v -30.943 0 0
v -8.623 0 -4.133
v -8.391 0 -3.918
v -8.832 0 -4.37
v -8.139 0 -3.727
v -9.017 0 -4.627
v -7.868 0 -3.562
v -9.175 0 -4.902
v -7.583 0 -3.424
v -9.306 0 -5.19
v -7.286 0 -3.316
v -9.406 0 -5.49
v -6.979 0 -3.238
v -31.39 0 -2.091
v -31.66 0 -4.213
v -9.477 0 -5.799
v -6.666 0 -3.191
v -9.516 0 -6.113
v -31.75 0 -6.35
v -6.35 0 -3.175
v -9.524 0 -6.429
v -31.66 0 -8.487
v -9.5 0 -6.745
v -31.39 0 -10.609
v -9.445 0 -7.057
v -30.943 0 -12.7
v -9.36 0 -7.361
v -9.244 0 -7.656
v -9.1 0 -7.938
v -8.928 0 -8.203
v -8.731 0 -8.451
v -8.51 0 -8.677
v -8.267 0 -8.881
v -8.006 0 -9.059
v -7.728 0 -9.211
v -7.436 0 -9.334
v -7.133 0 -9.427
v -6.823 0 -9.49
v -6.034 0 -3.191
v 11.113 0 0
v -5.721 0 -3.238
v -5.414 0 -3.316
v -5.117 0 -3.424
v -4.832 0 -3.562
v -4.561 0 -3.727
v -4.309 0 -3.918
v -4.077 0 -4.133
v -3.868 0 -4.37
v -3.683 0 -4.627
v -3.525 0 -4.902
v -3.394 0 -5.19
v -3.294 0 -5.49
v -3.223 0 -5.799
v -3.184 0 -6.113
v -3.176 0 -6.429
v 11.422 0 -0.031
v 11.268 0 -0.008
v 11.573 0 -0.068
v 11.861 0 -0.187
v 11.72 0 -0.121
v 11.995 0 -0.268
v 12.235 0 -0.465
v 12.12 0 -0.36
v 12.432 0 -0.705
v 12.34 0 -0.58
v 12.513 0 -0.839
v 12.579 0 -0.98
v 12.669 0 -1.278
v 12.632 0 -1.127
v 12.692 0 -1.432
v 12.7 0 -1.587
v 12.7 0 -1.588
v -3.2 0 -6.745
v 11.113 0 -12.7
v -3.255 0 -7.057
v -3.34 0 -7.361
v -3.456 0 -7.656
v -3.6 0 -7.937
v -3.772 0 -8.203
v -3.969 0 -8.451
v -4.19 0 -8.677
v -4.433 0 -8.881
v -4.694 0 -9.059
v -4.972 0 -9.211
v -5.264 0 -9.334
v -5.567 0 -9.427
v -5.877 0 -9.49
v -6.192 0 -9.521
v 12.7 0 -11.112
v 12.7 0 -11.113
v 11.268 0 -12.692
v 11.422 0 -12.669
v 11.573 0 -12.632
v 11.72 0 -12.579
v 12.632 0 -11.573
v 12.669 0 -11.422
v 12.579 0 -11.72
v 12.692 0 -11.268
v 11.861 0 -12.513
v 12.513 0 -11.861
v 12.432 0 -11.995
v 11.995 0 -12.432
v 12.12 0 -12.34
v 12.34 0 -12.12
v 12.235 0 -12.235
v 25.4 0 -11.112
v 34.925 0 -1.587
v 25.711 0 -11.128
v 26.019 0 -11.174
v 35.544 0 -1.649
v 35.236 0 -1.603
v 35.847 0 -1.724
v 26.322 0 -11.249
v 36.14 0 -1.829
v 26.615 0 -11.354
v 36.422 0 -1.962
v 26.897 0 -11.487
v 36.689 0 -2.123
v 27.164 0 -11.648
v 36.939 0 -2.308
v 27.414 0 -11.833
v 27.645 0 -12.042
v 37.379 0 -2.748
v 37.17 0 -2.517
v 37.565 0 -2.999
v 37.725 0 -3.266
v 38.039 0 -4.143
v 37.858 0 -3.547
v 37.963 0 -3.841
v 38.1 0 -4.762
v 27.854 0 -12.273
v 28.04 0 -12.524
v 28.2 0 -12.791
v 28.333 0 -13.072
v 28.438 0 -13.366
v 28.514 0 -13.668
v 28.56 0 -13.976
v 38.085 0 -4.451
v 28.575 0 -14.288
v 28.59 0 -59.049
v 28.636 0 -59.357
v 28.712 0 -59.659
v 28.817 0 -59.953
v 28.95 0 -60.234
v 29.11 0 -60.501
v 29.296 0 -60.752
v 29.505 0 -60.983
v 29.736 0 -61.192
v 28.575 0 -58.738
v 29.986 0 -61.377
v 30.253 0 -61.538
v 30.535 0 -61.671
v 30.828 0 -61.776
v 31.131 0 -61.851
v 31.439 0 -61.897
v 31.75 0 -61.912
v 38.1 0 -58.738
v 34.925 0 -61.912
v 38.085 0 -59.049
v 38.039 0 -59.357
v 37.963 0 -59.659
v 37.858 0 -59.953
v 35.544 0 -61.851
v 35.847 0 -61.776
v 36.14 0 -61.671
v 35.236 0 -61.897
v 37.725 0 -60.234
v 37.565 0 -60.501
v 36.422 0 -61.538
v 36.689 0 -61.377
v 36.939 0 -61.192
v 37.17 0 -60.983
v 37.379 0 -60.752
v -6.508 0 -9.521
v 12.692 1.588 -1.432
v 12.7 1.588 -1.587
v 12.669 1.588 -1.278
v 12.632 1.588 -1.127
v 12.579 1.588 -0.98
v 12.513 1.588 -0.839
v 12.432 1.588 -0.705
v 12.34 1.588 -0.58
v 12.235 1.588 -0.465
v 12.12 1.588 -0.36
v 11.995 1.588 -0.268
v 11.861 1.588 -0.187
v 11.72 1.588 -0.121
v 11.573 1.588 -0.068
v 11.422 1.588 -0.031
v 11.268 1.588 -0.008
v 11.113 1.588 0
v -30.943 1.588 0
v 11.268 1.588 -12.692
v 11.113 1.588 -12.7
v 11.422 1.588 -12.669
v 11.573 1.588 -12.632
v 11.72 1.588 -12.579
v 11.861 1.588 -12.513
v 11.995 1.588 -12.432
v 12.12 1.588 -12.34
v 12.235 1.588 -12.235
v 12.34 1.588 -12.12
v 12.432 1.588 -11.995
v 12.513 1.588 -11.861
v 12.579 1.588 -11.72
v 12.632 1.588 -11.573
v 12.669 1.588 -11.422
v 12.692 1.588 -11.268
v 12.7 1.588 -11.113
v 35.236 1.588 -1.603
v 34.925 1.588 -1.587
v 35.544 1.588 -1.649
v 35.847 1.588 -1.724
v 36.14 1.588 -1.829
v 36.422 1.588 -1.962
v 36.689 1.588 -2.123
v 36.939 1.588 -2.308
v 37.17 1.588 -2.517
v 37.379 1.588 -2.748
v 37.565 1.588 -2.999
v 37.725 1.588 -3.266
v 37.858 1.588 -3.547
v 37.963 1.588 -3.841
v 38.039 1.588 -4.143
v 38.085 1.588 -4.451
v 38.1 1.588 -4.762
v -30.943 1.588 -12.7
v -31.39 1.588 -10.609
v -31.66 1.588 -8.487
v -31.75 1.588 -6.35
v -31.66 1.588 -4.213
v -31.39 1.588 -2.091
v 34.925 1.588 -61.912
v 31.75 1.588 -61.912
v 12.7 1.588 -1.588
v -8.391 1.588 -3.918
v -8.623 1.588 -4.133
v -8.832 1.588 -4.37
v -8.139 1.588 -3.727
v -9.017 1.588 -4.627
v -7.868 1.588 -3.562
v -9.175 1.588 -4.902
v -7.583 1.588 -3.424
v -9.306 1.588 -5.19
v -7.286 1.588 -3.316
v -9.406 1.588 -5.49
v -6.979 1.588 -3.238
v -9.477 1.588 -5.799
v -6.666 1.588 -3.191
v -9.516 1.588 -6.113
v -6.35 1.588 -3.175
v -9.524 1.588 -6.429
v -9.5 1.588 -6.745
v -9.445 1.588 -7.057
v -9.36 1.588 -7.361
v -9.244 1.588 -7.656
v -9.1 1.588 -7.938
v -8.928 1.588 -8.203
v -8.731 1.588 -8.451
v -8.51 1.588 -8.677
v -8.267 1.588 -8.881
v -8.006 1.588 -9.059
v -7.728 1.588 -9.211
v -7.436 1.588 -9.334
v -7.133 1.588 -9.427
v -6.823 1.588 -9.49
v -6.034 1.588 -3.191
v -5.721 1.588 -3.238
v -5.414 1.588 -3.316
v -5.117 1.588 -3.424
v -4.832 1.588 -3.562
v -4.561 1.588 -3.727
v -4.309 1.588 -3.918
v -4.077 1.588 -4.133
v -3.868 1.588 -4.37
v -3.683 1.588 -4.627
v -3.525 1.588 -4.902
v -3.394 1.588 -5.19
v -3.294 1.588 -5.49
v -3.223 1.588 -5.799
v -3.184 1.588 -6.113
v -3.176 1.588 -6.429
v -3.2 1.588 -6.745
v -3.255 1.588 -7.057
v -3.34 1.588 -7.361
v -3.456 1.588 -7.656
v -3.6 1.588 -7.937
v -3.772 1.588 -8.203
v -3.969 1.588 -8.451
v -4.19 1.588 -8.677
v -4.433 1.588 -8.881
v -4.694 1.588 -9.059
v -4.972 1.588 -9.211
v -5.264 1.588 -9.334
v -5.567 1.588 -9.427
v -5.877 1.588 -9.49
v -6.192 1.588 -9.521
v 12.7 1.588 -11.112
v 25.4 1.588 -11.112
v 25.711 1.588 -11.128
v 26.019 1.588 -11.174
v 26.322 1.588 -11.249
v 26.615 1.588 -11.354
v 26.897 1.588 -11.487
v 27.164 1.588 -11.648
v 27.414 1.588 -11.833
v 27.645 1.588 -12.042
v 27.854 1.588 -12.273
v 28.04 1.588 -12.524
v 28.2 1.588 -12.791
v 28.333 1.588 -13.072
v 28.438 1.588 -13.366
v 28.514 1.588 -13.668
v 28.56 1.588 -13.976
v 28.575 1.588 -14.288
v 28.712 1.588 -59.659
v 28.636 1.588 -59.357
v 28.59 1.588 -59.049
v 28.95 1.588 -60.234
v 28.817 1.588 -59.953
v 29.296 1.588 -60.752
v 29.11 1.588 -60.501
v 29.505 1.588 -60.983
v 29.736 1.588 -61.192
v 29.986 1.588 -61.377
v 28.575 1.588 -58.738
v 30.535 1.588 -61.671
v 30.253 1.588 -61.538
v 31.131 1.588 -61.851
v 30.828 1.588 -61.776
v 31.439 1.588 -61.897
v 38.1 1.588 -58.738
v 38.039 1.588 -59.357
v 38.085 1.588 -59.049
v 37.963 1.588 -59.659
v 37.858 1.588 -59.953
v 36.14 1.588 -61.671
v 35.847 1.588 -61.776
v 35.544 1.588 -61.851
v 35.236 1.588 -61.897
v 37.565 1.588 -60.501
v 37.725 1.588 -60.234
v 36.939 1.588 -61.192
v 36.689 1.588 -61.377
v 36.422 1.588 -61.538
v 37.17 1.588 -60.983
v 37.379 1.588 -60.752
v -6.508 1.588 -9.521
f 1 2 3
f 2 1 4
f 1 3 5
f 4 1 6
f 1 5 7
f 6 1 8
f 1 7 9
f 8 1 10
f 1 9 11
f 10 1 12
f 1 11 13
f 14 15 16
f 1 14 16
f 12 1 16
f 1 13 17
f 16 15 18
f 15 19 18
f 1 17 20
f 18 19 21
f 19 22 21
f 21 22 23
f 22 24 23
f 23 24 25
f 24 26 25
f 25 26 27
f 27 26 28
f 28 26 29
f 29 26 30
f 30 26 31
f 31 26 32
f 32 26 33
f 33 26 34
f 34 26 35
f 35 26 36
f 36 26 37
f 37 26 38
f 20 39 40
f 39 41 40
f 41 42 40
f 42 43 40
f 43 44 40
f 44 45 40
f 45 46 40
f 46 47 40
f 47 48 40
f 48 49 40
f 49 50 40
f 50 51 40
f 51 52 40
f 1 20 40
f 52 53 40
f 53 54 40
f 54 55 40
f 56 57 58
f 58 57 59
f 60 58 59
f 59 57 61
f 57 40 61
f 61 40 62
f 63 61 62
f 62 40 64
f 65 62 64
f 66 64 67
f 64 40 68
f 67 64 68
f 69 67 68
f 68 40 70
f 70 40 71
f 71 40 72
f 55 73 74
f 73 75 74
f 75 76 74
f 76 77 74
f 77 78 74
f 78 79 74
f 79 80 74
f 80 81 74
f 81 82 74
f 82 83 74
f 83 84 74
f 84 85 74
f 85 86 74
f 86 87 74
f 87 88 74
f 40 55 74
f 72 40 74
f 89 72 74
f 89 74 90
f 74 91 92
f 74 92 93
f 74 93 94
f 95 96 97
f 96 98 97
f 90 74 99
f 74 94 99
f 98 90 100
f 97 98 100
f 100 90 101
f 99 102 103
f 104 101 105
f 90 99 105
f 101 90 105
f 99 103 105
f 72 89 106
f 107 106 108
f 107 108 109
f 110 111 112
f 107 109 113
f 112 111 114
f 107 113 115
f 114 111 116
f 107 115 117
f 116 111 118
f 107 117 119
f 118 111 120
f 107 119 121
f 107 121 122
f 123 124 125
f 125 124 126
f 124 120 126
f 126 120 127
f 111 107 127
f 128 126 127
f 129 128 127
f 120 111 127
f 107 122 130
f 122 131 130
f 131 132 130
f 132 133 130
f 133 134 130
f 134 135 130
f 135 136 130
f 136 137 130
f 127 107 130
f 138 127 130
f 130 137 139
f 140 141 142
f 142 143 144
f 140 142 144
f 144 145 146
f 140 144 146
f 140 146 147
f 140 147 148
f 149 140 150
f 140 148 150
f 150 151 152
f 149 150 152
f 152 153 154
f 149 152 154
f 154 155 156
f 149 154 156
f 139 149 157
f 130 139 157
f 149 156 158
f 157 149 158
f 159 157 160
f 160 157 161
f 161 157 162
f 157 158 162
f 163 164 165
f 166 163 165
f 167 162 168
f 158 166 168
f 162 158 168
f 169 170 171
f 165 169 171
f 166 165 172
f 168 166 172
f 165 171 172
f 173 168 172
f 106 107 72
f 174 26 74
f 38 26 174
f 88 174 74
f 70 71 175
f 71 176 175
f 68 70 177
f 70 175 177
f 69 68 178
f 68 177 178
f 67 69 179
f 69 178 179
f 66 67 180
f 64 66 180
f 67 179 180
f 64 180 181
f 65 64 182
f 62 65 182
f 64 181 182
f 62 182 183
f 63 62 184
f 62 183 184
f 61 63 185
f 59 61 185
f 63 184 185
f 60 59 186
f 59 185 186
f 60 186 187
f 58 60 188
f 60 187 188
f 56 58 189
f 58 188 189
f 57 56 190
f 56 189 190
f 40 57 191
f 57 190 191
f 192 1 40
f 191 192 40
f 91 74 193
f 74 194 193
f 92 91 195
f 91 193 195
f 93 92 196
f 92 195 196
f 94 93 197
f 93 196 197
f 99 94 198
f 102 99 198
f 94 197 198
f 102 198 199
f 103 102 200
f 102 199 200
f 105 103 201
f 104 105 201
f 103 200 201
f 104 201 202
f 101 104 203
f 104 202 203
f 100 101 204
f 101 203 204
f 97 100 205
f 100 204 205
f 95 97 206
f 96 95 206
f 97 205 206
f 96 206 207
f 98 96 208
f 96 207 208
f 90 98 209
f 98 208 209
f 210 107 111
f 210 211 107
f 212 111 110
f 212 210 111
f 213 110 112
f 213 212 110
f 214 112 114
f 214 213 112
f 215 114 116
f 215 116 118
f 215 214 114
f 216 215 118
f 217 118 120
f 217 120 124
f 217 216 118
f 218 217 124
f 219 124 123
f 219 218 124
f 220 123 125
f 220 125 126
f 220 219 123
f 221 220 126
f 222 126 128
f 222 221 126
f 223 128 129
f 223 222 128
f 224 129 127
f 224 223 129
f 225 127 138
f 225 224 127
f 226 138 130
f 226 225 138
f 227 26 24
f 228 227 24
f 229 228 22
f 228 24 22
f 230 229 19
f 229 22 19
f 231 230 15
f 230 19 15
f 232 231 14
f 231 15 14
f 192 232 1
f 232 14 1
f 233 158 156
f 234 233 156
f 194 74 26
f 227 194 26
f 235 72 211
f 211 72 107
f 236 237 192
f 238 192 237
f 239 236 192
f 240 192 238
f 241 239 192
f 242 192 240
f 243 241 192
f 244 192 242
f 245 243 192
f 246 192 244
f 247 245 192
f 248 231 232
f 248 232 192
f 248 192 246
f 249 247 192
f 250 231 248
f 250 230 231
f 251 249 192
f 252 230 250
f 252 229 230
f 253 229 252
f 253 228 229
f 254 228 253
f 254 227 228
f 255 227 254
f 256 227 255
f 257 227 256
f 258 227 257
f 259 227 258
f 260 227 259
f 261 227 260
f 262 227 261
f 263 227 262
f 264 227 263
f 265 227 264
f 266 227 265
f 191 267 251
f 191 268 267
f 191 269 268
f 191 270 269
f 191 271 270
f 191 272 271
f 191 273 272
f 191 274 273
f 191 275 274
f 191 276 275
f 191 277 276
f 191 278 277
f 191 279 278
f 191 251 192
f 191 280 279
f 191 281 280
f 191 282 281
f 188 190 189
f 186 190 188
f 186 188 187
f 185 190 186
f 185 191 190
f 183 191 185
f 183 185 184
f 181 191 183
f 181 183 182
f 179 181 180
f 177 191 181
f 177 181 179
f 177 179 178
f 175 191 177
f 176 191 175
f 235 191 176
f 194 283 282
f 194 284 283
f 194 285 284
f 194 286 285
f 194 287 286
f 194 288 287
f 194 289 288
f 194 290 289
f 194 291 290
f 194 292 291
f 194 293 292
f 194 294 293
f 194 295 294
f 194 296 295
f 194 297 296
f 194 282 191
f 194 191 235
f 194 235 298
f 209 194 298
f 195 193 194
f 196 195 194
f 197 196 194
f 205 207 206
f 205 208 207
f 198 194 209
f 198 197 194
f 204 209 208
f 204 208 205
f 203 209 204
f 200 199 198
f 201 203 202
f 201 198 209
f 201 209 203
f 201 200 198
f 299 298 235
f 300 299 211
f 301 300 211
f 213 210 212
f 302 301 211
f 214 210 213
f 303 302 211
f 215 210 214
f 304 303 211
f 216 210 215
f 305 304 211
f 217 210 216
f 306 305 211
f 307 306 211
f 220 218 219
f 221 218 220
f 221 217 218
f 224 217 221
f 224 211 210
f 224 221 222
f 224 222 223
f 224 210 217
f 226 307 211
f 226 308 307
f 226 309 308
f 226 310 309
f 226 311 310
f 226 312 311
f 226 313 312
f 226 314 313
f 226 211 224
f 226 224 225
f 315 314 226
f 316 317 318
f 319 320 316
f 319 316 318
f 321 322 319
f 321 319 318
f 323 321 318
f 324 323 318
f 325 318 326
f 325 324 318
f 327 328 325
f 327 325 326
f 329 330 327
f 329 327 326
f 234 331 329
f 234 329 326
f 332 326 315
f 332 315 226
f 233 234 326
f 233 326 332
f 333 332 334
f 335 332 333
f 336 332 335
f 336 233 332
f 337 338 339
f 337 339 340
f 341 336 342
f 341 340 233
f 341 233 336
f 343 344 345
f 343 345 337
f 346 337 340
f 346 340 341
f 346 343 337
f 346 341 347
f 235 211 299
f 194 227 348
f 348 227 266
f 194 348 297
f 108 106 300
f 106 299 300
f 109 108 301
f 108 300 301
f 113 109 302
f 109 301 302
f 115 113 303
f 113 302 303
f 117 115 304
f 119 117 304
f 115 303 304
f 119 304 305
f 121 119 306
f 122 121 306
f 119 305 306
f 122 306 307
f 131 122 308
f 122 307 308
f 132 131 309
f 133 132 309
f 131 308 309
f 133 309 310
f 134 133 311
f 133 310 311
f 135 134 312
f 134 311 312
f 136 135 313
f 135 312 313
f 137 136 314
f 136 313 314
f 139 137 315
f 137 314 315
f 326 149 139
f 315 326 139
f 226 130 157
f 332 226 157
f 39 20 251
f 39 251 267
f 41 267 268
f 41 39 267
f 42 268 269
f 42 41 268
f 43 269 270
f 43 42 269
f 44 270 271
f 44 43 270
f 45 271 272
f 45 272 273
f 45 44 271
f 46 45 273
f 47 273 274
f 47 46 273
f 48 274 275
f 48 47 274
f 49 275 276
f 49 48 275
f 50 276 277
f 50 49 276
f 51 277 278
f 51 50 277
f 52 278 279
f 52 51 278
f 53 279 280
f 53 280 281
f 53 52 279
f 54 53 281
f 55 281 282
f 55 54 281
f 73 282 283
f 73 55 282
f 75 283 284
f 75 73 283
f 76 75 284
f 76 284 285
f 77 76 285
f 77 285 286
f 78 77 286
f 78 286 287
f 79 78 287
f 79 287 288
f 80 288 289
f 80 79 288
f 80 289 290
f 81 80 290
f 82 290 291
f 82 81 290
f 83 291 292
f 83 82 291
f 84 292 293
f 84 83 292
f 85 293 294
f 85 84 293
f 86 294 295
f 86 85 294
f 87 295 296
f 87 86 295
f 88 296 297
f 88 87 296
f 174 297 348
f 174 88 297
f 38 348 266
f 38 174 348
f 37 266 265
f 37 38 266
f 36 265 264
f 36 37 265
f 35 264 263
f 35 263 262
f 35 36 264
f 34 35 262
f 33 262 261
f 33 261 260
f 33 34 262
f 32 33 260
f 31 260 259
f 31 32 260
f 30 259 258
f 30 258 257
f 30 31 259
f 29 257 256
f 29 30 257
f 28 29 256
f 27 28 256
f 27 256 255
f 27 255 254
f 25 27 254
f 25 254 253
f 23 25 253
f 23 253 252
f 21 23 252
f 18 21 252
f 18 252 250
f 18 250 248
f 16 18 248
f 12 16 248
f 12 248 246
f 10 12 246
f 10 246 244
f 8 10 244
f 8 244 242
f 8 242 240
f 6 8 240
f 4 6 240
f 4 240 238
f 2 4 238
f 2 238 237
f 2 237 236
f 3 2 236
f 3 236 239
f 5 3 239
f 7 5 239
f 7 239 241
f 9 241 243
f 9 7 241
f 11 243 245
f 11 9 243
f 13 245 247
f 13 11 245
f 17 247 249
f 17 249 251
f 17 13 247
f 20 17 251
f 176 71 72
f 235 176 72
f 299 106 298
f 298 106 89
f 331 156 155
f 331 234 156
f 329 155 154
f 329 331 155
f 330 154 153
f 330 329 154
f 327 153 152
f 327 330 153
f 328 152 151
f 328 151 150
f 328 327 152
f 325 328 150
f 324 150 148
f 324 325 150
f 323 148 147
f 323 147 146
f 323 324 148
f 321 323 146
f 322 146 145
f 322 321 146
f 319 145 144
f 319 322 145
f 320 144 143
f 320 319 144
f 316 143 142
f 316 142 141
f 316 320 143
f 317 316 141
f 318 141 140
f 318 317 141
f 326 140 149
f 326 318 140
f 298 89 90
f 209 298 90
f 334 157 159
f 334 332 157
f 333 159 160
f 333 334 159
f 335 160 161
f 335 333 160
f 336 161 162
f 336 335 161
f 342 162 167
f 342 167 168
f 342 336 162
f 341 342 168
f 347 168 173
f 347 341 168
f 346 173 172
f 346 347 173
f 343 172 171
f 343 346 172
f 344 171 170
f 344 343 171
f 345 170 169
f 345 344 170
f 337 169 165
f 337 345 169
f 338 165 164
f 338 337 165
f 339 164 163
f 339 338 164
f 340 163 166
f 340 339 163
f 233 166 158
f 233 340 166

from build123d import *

# Parameters (mm, degrees)
SKETCH1_R           = 3.175
BOSS_EXTRUDE1_DEPTH = 1.5875
FILLET1_R           = 3.175
FILLET2_R           = 1.5875


with BuildPart() as part:
    # Sketch1 → Boss-Extrude1 (new body)
    with BuildSketch(Plane(origin=(0, 0, 0), x_dir=(1, 0, 0), z_dir=(0, 1, 0))):
        with BuildLine():
            Line((-30.943444248, 0), (12.7, 0))
            Line((12.7, 0), (12.7, 1.5875))
            Line((12.7, 1.5875), (38.1, 1.5875))
            Line((38.1, 1.5875), (38.1, 61.9125))
            Line((38.1, 61.9125), (28.575, 61.9125))
            Line((28.575, 61.9125), (28.575, 11.1125))
            Line((28.575, 11.1125), (12.7, 11.1125))
            Line((12.7, 11.1125), (12.7, 12.7))
            Line((12.7, 12.7), (-30.943444248, 12.7))
            ThreePointArc((-30.943444248, 12.7), (-31.75, 6.35), (-30.943444248, 0))
        make_face()
        with Locations(Location((-6.35, 6.35, 0), (0, 0, 270))):
            Circle(SKETCH1_R, mode=Mode.SUBTRACT)
    extrude(amount=BOSS_EXTRUDE1_DEPTH)

    # Fillet1
    fillet1_edges = [part.edges().sort_by_distance(p)[0] for p in [
        (28.575, 0.79375, -11.1125),
        (28.575, 0.79375, -61.9125),
        (38.1, 0.79375, -61.9125),
        (38.1, 0.79375, -1.5875),
    ]]
    fillet(fillet1_edges, radius=FILLET1_R)

    # Fillet2
    fillet2_edges = [part.edges().sort_by_distance(p)[0] for p in [
        (12.7, 0.79375, 0),
        (12.7, 0.79375, -12.7),
    ]]
    fillet(fillet2_edges, radius=FILLET2_R - 0.0001)  # a hair under: the kernel refuses the full size


solid = part.part
